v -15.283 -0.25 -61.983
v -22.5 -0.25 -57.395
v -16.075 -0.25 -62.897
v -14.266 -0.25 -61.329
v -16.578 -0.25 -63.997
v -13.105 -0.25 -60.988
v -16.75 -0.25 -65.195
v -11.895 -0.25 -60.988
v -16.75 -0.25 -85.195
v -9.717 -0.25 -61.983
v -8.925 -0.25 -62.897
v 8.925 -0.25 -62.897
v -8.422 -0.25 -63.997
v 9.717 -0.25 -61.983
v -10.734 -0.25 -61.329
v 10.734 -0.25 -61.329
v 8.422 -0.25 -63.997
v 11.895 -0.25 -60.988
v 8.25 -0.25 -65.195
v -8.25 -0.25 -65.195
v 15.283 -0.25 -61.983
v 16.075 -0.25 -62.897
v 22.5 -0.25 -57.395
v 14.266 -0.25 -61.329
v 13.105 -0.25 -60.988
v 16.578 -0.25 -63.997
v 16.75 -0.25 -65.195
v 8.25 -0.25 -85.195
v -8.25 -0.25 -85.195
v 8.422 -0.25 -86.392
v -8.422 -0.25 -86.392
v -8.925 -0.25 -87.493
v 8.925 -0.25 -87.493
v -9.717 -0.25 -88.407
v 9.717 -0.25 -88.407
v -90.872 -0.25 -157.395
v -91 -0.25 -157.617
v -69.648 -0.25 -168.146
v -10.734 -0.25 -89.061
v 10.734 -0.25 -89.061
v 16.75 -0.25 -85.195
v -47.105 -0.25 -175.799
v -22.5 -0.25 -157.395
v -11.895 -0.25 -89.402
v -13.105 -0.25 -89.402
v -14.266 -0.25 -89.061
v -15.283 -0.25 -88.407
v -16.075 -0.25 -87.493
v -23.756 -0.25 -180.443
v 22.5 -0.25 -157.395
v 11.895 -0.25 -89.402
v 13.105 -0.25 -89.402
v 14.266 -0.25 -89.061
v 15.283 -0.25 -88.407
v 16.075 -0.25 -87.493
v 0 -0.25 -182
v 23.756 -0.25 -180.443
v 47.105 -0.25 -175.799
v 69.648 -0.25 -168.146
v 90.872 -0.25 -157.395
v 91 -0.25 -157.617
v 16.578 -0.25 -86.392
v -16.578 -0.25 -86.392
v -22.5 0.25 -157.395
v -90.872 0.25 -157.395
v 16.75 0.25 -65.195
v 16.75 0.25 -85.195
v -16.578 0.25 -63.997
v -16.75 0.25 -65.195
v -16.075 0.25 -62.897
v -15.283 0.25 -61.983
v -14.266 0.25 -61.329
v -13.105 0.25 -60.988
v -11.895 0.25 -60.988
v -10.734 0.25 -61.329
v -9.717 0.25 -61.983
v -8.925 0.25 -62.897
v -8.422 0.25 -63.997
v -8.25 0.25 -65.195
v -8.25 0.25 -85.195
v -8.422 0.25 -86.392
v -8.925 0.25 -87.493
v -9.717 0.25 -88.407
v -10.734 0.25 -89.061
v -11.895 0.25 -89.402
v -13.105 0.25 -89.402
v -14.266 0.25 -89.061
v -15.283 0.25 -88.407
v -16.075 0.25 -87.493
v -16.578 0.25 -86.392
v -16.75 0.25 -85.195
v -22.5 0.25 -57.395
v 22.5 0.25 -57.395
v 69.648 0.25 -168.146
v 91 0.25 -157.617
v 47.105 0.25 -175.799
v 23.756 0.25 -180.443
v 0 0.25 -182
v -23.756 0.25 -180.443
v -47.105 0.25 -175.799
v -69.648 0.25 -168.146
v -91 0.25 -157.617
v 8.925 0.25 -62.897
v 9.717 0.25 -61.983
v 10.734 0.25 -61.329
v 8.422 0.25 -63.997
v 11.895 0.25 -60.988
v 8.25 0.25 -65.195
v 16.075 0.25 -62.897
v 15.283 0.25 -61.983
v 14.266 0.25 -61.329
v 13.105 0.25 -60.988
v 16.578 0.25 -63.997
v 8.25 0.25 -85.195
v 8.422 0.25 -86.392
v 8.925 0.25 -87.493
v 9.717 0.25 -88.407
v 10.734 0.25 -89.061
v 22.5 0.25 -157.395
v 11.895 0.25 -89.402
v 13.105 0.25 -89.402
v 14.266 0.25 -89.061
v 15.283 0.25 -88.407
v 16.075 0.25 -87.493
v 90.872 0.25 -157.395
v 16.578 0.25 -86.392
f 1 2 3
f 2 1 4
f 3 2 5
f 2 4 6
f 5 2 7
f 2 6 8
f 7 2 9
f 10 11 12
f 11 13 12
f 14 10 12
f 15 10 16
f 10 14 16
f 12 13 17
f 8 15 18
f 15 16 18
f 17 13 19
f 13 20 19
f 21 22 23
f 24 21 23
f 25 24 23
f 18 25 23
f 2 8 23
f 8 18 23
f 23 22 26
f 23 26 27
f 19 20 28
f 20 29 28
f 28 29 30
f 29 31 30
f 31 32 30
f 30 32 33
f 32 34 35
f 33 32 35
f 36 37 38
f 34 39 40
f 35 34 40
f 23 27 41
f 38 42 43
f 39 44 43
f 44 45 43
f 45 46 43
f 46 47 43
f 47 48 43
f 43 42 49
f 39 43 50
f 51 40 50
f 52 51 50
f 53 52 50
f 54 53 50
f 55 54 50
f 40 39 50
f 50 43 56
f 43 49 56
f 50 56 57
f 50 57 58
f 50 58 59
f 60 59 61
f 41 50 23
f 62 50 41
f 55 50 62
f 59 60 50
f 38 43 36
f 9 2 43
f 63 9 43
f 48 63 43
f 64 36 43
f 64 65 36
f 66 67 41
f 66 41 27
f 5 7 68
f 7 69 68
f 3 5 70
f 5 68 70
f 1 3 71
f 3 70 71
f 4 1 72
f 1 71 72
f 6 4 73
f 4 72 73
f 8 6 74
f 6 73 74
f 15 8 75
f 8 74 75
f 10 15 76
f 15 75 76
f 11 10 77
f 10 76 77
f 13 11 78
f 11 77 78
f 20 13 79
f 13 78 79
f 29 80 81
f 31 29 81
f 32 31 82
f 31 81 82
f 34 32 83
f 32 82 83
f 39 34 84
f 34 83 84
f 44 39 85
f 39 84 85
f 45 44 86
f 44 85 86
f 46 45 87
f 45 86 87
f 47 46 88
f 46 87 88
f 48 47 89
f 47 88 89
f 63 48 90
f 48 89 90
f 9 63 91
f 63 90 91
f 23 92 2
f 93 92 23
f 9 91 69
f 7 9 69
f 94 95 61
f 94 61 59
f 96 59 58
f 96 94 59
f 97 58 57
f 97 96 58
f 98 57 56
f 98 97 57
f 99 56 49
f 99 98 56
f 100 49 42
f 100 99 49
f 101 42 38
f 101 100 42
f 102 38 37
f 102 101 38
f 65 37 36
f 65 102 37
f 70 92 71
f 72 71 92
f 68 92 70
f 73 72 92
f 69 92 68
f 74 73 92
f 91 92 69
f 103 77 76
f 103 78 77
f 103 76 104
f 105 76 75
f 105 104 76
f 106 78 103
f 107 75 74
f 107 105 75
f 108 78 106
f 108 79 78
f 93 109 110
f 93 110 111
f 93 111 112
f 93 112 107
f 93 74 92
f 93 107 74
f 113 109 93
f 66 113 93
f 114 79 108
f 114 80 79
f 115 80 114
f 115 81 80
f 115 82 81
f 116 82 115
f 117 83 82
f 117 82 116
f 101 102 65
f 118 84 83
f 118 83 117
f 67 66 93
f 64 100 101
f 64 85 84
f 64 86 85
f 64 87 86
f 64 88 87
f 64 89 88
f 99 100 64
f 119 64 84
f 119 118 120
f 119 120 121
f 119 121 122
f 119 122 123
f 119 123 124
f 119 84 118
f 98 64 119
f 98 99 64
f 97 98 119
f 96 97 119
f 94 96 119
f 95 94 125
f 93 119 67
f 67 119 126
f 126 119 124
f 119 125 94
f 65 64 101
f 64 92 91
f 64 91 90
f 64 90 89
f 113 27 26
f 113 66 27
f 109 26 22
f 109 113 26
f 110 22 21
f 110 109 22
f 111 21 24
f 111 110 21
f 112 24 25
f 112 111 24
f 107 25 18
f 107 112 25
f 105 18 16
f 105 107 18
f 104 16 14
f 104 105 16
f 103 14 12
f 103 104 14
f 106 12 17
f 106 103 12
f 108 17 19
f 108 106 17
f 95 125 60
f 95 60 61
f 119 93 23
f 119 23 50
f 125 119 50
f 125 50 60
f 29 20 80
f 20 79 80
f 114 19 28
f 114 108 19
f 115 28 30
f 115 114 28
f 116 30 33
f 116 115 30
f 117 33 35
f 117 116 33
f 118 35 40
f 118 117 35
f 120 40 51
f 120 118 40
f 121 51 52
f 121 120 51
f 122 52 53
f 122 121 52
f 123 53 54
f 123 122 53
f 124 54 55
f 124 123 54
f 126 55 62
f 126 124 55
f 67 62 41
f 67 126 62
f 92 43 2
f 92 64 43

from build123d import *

# Parameters (mm, degrees)
BOSS_EXTRUDE1_DEPTH = 0.25


with BuildPart() as part:
    # Sketch1 → Boss-Extrude1 (new, symmetric)
    with BuildSketch(Plane(origin=(0, 0, 0), x_dir=(1, 0, 0), z_dir=(0, 1, 0))):
        with BuildLine():
            Line((-22.5, 57.39480496), (22.5, 57.39480496))
            Line((22.5, 57.39480496), (22.5, 157.39480496))
            Line((22.5, 157.39480496), (90.871933013, 157.39480496))
            Line((90.871933013, 157.39480496), (91, 157.616623489))
            ThreePointArc((91, 157.616623489), (0, 182), (-91, 157.616623489))
            Line((-91, 157.616623489), (-90.871933013, 157.39480496))
            Line((-90.871933013, 157.39480496), (-22.5, 157.39480496))
            Line((-22.5, 157.39480496), (-22.5, 57.39480496))
        make_face()
        with BuildLine():
            Line((-16.75, 85.19480496), (-16.75, 65.19480496))
            ThreePointArc((-16.75, 65.19480496), (-12.5, 60.94480496), (-8.25, 65.19480496))
            Line((-8.25, 65.19480496), (-8.25, 85.19480496))
            ThreePointArc((-8.25, 85.19480496), (-12.5, 89.44480496), (-16.75, 85.19480496))
        make_face(mode=Mode.SUBTRACT)
        with BuildLine():
            Line((16.75, 85.19480496), (16.75, 65.19480496))
            ThreePointArc((16.75, 65.19480496), (12.5, 60.94480496), (8.25, 65.19480496))
            Line((8.25, 65.19480496), (8.25, 85.19480496))
            ThreePointArc((8.25, 85.19480496), (12.5, 89.44480496), (16.75, 85.19480496))
        make_face(mode=Mode.SUBTRACT)
    extrude(amount=BOSS_EXTRUDE1_DEPTH, both=True)


solid = part.part
